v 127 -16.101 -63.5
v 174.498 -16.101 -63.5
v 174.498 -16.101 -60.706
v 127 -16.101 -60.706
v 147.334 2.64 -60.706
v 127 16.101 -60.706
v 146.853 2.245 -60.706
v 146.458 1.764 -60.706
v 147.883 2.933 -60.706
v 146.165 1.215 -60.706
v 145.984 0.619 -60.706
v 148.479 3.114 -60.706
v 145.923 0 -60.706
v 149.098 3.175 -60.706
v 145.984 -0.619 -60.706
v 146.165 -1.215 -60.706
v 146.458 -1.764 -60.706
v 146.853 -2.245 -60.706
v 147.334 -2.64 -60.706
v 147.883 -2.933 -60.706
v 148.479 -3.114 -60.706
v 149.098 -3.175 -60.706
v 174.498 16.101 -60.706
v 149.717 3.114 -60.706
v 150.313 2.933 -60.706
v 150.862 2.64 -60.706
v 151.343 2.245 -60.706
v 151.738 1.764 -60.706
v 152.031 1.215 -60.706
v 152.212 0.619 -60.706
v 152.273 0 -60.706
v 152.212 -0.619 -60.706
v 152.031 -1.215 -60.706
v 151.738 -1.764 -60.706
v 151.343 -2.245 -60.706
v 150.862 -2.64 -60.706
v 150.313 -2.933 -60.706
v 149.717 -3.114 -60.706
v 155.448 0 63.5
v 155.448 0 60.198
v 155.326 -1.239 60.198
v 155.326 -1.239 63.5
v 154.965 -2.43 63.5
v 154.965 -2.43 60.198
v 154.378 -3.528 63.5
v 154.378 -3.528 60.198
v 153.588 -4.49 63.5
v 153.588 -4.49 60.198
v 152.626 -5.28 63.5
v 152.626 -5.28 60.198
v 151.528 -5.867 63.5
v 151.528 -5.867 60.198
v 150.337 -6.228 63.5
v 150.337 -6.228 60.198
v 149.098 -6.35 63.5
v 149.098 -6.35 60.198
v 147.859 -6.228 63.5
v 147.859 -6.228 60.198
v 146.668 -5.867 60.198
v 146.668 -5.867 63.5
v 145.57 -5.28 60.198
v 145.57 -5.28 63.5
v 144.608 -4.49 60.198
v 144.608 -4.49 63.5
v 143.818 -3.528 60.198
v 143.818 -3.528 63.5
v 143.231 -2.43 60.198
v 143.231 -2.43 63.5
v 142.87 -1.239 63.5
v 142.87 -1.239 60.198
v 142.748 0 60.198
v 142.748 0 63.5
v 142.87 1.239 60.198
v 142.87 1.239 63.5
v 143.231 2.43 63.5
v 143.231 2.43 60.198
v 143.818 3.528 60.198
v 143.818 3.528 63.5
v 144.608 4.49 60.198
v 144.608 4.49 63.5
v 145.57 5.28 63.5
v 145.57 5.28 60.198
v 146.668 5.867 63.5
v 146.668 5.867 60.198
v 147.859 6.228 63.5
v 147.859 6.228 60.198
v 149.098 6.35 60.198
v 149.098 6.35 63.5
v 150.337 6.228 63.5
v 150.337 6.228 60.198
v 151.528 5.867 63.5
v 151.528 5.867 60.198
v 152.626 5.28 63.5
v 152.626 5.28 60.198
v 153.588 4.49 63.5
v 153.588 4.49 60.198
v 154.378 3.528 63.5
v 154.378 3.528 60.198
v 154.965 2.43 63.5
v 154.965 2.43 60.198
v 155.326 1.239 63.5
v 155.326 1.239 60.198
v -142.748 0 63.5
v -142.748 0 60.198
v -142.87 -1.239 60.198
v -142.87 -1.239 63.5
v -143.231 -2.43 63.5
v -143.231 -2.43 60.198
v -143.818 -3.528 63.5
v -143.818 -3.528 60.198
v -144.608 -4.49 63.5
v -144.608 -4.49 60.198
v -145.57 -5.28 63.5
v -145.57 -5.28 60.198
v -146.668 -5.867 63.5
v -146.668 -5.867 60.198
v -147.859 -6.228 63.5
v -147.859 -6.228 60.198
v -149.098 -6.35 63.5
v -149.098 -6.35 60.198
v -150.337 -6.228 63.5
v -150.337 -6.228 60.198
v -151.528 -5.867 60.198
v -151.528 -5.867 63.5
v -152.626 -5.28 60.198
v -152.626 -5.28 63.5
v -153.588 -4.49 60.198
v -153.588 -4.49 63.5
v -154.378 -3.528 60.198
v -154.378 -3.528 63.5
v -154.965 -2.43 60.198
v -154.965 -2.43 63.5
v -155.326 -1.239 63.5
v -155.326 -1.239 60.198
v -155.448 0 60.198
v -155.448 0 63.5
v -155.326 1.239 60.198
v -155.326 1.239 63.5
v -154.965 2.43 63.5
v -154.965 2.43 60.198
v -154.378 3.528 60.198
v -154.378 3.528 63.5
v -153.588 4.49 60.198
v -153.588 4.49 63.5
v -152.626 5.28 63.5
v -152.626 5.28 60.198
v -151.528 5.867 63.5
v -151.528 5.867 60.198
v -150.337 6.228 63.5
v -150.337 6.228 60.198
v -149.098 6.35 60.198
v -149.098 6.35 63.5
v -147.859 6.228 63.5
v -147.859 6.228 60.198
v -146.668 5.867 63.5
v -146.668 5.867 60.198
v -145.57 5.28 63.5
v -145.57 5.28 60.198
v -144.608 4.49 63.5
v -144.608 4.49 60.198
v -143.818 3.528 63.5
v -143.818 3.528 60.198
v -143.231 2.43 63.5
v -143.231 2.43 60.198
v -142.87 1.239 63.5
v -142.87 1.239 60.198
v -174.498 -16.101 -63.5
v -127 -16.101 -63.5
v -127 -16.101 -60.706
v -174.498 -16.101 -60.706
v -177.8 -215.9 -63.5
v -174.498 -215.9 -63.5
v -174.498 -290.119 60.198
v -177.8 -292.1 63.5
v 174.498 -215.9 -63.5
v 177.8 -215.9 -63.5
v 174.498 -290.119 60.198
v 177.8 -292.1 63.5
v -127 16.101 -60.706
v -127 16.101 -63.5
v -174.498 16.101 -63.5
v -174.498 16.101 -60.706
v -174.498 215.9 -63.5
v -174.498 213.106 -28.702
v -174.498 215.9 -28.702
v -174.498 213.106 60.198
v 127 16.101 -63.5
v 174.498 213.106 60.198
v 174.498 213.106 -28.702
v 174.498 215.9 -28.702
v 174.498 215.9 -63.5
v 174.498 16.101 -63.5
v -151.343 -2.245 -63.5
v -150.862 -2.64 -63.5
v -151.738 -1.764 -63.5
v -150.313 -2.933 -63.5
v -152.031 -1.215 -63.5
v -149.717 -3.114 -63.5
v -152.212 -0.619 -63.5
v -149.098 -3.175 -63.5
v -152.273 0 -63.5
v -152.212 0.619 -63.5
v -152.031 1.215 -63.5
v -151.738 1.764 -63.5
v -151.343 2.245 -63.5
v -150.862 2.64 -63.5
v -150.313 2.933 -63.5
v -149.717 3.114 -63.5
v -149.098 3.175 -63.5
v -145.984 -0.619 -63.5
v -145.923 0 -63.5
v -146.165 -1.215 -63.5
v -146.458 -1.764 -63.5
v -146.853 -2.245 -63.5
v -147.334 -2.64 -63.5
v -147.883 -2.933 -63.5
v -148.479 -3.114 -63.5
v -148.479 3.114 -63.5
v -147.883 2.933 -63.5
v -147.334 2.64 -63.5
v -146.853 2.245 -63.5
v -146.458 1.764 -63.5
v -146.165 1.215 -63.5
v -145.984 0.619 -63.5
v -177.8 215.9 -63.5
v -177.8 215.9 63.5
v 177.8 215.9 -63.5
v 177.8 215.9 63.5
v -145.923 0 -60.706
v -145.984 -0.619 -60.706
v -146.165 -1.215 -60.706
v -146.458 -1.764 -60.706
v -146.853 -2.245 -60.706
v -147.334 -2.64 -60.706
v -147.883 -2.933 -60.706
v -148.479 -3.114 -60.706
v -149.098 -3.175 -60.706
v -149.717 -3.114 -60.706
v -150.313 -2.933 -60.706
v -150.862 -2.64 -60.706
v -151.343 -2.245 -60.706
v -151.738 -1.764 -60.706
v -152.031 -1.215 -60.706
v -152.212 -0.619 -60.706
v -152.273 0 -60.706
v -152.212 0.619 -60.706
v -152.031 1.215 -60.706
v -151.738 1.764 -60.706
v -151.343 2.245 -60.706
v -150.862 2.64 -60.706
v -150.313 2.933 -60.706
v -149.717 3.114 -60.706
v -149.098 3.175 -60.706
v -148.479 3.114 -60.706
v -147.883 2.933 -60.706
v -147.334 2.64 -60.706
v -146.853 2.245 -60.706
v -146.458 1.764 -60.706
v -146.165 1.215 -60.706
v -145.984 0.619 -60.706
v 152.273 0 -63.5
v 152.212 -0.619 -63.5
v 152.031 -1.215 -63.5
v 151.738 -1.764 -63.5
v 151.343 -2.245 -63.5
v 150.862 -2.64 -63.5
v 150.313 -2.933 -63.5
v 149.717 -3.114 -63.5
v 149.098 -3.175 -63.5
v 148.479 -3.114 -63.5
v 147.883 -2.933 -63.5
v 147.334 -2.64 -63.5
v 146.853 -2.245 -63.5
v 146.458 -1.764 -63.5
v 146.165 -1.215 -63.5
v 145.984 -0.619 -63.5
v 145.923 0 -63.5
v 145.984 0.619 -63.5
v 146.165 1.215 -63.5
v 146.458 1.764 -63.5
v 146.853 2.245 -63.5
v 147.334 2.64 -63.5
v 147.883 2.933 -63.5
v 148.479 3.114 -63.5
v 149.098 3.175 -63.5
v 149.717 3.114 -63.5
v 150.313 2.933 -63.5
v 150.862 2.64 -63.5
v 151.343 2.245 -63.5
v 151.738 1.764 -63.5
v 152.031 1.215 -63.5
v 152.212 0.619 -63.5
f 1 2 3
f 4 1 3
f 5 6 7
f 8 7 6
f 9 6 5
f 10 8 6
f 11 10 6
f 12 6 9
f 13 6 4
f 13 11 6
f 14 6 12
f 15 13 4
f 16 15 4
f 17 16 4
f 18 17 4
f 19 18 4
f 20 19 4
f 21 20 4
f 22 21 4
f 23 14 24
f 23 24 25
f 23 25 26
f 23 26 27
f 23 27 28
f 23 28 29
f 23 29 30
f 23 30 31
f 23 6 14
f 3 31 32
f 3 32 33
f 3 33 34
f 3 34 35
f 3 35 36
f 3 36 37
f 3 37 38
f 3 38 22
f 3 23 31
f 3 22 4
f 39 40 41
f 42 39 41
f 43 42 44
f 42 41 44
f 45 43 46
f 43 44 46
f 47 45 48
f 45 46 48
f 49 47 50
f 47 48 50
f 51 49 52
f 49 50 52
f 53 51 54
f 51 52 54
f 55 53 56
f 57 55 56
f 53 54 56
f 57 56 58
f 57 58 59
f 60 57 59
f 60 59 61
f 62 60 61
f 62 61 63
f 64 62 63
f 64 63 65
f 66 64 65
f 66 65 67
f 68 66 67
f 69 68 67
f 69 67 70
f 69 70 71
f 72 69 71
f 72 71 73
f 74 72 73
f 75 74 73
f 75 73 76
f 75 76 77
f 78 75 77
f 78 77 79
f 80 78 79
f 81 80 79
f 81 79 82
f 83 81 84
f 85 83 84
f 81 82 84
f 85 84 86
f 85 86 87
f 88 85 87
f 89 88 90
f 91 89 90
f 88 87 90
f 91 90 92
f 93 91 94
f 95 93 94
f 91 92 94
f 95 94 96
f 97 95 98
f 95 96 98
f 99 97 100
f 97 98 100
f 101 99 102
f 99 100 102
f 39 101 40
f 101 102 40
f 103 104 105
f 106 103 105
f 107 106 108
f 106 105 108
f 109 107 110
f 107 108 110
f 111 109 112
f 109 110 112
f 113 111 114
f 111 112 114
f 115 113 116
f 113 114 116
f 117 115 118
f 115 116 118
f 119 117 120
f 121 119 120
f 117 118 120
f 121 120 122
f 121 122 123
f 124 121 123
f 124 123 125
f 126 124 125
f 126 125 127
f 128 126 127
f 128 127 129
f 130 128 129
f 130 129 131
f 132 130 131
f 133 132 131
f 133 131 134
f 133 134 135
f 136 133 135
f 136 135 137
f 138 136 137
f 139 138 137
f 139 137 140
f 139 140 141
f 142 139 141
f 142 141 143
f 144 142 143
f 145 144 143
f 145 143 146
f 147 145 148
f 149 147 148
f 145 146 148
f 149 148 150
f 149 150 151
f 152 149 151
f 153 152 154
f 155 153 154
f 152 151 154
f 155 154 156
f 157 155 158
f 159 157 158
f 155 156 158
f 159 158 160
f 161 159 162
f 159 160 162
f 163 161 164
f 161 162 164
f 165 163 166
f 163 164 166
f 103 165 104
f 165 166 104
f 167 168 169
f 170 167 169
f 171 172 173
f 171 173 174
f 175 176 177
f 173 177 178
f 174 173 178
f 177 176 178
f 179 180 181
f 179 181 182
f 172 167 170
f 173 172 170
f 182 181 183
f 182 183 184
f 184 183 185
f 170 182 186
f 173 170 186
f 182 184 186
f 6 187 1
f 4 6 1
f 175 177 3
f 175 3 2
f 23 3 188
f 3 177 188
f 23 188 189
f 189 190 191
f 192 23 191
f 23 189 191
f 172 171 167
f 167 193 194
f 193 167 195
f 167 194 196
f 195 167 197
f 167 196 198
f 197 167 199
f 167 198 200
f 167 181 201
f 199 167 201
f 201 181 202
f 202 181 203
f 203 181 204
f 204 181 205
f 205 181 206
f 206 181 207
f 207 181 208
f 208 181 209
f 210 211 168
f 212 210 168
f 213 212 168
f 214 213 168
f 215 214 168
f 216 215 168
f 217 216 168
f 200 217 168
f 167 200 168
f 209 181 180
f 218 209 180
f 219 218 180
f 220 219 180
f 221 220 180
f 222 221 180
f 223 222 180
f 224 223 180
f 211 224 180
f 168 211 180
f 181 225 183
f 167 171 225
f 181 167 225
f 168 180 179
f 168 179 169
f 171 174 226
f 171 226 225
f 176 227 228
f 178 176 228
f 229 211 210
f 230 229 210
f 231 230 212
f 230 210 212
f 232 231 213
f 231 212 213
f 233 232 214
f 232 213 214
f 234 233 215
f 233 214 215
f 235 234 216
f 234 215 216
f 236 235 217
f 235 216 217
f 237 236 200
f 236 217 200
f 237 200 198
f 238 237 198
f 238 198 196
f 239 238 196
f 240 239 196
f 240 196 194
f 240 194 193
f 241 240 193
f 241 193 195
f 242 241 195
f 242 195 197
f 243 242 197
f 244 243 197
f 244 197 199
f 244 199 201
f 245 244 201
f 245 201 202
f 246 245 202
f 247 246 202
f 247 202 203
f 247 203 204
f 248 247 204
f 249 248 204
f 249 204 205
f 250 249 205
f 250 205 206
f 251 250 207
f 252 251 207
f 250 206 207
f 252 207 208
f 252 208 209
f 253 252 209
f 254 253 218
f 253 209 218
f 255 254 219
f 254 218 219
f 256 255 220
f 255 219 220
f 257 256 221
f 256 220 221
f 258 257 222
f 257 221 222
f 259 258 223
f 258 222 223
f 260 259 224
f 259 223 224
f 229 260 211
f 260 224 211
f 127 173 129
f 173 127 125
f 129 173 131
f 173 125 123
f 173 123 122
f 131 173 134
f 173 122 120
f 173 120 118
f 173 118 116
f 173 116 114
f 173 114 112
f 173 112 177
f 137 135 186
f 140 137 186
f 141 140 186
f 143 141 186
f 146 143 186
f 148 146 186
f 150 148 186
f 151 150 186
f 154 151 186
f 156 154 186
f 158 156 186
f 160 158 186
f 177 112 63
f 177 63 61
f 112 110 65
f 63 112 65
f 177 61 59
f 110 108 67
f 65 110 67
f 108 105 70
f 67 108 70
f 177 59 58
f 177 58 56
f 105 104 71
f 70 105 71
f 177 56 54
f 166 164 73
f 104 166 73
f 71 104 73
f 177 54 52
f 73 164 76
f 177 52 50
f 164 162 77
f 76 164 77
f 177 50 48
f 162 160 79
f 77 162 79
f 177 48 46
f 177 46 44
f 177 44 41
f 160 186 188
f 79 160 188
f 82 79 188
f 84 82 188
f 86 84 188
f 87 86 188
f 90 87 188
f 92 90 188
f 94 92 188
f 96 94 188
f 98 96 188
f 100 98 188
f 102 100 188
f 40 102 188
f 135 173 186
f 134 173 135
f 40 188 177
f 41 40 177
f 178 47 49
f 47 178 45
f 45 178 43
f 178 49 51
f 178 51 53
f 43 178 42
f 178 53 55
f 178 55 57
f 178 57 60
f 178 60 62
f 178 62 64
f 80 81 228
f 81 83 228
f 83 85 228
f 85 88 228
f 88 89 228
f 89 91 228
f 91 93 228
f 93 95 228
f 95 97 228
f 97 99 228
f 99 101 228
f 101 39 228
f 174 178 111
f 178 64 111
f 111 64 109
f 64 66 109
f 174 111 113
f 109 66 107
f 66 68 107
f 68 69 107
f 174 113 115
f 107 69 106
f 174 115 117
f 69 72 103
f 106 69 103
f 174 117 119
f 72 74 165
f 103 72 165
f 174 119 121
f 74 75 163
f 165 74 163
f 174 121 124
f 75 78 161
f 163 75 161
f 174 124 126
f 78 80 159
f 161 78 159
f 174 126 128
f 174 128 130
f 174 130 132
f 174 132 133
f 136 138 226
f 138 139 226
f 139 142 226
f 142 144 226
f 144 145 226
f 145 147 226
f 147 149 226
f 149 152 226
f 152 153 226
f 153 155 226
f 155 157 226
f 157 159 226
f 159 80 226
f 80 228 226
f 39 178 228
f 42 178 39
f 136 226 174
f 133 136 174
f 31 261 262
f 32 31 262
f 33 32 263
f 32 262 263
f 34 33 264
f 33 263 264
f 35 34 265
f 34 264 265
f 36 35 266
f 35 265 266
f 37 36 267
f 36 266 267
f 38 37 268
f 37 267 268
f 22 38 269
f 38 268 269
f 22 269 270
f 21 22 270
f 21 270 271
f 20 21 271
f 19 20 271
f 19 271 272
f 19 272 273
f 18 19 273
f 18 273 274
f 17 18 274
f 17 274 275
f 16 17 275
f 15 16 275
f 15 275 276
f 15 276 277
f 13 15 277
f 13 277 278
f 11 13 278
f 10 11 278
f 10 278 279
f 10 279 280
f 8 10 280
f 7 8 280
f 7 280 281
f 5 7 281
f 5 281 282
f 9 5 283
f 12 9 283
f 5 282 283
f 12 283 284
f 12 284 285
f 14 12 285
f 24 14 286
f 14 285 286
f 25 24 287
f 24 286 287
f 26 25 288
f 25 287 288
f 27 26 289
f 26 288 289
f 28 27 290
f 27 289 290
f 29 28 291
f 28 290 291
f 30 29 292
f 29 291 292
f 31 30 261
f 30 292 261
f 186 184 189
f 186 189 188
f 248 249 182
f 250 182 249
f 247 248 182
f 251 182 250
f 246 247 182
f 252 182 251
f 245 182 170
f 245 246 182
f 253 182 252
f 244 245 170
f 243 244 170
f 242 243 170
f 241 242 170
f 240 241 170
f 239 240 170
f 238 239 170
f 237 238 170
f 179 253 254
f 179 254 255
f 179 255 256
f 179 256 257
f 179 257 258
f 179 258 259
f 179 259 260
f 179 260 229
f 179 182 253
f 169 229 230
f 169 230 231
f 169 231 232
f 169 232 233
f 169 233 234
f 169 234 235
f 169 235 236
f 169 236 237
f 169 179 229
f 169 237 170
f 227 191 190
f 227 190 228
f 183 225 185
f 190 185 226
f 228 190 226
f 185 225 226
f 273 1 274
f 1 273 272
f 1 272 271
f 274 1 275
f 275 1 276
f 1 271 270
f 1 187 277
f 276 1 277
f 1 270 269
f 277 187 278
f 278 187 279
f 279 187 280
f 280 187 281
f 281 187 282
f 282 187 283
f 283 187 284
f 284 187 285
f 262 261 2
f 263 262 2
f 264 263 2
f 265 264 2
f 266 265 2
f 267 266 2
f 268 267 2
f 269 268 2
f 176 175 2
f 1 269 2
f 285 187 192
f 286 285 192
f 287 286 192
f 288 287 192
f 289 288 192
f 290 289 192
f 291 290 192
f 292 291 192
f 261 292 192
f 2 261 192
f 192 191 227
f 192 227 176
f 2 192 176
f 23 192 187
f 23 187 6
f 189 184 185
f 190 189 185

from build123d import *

# Parameters (mm, degrees)
F2_DEPTH      = 215.9
F3_DEPTH      = 76.2
F5_DEPTH      = 375.92
F5_DEPTH_BACK = 25.4
F6_W          = 2.794
F6_H          = 88.9
F7_DEPTH      = 348.996
F8_W          = 32.20243752
F8_H          = 2.794
F9_DEPTH      = 348.996
F10_W         = 254
F10_H         = 32.20243752
F11_DEPTH     = 25.4
F12_R         = 3.175
F13_DEPTH     = 25.4
F15_DEPTH     = 25.4
F16_R         = 6.35
F17_DEPTH     = 25.4


with BuildPart() as f2:
    # F1 (on Front) → F2 (new body, symmetric)
    with BuildSketch(Plane.XZ):
        Polygon((177.8, 63.5), (-177.8, 63.5), (-177.8, -63.5), (-174.498, -63.5), (-174.498, 60.198), (174.498, 60.198), (174.498, -63.5), (177.8, -63.5), align=None)
    extrude(amount=F2_DEPTH, both=True)

    # F3 (add): a face of the model
    f3_faces = [f2.faces().sort_by_distance(p)[0] for p in [
        (176.149, -215.9, -59.7240185382),
    ]]
    extrude(f3_faces, amount=F3_DEPTH)

    # F4 (on face) → F5 (cut, two sides)
    with BuildSketch(Plane.YZ.offset(177.8)) as f5_sk:
        Polygon((-292.1, -63.5), (-215.9, -63.5), (-292.1, 63.5), align=None)
    extrude(amount=-F5_DEPTH, mode=Mode.SUBTRACT)
    extrude(f5_sk.sketch, amount=F5_DEPTH_BACK, mode=Mode.SUBTRACT)

    # F6 (on face) → F7 (join, through all)
    with BuildSketch(Plane.YZ.offset(-174.498)):
        with Locations((214.503, 15.748)):
            Rectangle(F6_W, F6_H)
    extrude(amount=F7_DEPTH)

    # F8 (on face) → F9 (join, through all)
    with BuildSketch(Plane(origin=(174.498, 0, 0), x_dir=(0, -1, 0), z_dir=(-1, 0, 0))):
        with Locations((0, -62.103)):
            Rectangle(F8_W, F8_H)
    extrude(amount=F9_DEPTH)

    # F10 (on face) → F11 (cut)
    with BuildSketch(Plane(origin=(0, 0, -63.5), x_dir=(1, 0, 0), z_dir=(0, 0, -1))):
        Rectangle(F10_W, F10_H)
    extrude(amount=-F11_DEPTH, mode=Mode.SUBTRACT)

    # F12 (on face) → F13 (cut)
    with BuildSketch(Plane(origin=(0, 0, -63.5), x_dir=(1, 0, 0), z_dir=(0, 0, -1))):
        with Locations((149.098, 0)):
            Circle(F12_R)
    extrude(amount=-F13_DEPTH, mode=Mode.SUBTRACT)

    # F14 (on face) → F15 (cut)
    with BuildSketch(Plane(origin=(0, 0, -63.5), x_dir=(1, 0, 0), z_dir=(0, 0, -1))):
        with BuildLine():
            ThreePointArc((-152.273, 0), (-149.098, -3.175), (-145.923, 0))
            ThreePointArc((-145.923, 0), (-149.098, 3.175), (-152.273, 0))
        make_face()
    extrude(amount=-F15_DEPTH, mode=Mode.SUBTRACT)

    # F16 (on face) → F17 (cut)
    with BuildSketch(Plane(origin=(0, 0, 60.198), x_dir=(1, 0, 0), z_dir=(0, 0, -1))):
        with Locations((149.098, 0)):
            Circle(F16_R)
        with Locations((-149.098, 0)):
            Circle(F16_R)
    extrude(amount=-F17_DEPTH, mode=Mode.SUBTRACT)


solid = f2.part
